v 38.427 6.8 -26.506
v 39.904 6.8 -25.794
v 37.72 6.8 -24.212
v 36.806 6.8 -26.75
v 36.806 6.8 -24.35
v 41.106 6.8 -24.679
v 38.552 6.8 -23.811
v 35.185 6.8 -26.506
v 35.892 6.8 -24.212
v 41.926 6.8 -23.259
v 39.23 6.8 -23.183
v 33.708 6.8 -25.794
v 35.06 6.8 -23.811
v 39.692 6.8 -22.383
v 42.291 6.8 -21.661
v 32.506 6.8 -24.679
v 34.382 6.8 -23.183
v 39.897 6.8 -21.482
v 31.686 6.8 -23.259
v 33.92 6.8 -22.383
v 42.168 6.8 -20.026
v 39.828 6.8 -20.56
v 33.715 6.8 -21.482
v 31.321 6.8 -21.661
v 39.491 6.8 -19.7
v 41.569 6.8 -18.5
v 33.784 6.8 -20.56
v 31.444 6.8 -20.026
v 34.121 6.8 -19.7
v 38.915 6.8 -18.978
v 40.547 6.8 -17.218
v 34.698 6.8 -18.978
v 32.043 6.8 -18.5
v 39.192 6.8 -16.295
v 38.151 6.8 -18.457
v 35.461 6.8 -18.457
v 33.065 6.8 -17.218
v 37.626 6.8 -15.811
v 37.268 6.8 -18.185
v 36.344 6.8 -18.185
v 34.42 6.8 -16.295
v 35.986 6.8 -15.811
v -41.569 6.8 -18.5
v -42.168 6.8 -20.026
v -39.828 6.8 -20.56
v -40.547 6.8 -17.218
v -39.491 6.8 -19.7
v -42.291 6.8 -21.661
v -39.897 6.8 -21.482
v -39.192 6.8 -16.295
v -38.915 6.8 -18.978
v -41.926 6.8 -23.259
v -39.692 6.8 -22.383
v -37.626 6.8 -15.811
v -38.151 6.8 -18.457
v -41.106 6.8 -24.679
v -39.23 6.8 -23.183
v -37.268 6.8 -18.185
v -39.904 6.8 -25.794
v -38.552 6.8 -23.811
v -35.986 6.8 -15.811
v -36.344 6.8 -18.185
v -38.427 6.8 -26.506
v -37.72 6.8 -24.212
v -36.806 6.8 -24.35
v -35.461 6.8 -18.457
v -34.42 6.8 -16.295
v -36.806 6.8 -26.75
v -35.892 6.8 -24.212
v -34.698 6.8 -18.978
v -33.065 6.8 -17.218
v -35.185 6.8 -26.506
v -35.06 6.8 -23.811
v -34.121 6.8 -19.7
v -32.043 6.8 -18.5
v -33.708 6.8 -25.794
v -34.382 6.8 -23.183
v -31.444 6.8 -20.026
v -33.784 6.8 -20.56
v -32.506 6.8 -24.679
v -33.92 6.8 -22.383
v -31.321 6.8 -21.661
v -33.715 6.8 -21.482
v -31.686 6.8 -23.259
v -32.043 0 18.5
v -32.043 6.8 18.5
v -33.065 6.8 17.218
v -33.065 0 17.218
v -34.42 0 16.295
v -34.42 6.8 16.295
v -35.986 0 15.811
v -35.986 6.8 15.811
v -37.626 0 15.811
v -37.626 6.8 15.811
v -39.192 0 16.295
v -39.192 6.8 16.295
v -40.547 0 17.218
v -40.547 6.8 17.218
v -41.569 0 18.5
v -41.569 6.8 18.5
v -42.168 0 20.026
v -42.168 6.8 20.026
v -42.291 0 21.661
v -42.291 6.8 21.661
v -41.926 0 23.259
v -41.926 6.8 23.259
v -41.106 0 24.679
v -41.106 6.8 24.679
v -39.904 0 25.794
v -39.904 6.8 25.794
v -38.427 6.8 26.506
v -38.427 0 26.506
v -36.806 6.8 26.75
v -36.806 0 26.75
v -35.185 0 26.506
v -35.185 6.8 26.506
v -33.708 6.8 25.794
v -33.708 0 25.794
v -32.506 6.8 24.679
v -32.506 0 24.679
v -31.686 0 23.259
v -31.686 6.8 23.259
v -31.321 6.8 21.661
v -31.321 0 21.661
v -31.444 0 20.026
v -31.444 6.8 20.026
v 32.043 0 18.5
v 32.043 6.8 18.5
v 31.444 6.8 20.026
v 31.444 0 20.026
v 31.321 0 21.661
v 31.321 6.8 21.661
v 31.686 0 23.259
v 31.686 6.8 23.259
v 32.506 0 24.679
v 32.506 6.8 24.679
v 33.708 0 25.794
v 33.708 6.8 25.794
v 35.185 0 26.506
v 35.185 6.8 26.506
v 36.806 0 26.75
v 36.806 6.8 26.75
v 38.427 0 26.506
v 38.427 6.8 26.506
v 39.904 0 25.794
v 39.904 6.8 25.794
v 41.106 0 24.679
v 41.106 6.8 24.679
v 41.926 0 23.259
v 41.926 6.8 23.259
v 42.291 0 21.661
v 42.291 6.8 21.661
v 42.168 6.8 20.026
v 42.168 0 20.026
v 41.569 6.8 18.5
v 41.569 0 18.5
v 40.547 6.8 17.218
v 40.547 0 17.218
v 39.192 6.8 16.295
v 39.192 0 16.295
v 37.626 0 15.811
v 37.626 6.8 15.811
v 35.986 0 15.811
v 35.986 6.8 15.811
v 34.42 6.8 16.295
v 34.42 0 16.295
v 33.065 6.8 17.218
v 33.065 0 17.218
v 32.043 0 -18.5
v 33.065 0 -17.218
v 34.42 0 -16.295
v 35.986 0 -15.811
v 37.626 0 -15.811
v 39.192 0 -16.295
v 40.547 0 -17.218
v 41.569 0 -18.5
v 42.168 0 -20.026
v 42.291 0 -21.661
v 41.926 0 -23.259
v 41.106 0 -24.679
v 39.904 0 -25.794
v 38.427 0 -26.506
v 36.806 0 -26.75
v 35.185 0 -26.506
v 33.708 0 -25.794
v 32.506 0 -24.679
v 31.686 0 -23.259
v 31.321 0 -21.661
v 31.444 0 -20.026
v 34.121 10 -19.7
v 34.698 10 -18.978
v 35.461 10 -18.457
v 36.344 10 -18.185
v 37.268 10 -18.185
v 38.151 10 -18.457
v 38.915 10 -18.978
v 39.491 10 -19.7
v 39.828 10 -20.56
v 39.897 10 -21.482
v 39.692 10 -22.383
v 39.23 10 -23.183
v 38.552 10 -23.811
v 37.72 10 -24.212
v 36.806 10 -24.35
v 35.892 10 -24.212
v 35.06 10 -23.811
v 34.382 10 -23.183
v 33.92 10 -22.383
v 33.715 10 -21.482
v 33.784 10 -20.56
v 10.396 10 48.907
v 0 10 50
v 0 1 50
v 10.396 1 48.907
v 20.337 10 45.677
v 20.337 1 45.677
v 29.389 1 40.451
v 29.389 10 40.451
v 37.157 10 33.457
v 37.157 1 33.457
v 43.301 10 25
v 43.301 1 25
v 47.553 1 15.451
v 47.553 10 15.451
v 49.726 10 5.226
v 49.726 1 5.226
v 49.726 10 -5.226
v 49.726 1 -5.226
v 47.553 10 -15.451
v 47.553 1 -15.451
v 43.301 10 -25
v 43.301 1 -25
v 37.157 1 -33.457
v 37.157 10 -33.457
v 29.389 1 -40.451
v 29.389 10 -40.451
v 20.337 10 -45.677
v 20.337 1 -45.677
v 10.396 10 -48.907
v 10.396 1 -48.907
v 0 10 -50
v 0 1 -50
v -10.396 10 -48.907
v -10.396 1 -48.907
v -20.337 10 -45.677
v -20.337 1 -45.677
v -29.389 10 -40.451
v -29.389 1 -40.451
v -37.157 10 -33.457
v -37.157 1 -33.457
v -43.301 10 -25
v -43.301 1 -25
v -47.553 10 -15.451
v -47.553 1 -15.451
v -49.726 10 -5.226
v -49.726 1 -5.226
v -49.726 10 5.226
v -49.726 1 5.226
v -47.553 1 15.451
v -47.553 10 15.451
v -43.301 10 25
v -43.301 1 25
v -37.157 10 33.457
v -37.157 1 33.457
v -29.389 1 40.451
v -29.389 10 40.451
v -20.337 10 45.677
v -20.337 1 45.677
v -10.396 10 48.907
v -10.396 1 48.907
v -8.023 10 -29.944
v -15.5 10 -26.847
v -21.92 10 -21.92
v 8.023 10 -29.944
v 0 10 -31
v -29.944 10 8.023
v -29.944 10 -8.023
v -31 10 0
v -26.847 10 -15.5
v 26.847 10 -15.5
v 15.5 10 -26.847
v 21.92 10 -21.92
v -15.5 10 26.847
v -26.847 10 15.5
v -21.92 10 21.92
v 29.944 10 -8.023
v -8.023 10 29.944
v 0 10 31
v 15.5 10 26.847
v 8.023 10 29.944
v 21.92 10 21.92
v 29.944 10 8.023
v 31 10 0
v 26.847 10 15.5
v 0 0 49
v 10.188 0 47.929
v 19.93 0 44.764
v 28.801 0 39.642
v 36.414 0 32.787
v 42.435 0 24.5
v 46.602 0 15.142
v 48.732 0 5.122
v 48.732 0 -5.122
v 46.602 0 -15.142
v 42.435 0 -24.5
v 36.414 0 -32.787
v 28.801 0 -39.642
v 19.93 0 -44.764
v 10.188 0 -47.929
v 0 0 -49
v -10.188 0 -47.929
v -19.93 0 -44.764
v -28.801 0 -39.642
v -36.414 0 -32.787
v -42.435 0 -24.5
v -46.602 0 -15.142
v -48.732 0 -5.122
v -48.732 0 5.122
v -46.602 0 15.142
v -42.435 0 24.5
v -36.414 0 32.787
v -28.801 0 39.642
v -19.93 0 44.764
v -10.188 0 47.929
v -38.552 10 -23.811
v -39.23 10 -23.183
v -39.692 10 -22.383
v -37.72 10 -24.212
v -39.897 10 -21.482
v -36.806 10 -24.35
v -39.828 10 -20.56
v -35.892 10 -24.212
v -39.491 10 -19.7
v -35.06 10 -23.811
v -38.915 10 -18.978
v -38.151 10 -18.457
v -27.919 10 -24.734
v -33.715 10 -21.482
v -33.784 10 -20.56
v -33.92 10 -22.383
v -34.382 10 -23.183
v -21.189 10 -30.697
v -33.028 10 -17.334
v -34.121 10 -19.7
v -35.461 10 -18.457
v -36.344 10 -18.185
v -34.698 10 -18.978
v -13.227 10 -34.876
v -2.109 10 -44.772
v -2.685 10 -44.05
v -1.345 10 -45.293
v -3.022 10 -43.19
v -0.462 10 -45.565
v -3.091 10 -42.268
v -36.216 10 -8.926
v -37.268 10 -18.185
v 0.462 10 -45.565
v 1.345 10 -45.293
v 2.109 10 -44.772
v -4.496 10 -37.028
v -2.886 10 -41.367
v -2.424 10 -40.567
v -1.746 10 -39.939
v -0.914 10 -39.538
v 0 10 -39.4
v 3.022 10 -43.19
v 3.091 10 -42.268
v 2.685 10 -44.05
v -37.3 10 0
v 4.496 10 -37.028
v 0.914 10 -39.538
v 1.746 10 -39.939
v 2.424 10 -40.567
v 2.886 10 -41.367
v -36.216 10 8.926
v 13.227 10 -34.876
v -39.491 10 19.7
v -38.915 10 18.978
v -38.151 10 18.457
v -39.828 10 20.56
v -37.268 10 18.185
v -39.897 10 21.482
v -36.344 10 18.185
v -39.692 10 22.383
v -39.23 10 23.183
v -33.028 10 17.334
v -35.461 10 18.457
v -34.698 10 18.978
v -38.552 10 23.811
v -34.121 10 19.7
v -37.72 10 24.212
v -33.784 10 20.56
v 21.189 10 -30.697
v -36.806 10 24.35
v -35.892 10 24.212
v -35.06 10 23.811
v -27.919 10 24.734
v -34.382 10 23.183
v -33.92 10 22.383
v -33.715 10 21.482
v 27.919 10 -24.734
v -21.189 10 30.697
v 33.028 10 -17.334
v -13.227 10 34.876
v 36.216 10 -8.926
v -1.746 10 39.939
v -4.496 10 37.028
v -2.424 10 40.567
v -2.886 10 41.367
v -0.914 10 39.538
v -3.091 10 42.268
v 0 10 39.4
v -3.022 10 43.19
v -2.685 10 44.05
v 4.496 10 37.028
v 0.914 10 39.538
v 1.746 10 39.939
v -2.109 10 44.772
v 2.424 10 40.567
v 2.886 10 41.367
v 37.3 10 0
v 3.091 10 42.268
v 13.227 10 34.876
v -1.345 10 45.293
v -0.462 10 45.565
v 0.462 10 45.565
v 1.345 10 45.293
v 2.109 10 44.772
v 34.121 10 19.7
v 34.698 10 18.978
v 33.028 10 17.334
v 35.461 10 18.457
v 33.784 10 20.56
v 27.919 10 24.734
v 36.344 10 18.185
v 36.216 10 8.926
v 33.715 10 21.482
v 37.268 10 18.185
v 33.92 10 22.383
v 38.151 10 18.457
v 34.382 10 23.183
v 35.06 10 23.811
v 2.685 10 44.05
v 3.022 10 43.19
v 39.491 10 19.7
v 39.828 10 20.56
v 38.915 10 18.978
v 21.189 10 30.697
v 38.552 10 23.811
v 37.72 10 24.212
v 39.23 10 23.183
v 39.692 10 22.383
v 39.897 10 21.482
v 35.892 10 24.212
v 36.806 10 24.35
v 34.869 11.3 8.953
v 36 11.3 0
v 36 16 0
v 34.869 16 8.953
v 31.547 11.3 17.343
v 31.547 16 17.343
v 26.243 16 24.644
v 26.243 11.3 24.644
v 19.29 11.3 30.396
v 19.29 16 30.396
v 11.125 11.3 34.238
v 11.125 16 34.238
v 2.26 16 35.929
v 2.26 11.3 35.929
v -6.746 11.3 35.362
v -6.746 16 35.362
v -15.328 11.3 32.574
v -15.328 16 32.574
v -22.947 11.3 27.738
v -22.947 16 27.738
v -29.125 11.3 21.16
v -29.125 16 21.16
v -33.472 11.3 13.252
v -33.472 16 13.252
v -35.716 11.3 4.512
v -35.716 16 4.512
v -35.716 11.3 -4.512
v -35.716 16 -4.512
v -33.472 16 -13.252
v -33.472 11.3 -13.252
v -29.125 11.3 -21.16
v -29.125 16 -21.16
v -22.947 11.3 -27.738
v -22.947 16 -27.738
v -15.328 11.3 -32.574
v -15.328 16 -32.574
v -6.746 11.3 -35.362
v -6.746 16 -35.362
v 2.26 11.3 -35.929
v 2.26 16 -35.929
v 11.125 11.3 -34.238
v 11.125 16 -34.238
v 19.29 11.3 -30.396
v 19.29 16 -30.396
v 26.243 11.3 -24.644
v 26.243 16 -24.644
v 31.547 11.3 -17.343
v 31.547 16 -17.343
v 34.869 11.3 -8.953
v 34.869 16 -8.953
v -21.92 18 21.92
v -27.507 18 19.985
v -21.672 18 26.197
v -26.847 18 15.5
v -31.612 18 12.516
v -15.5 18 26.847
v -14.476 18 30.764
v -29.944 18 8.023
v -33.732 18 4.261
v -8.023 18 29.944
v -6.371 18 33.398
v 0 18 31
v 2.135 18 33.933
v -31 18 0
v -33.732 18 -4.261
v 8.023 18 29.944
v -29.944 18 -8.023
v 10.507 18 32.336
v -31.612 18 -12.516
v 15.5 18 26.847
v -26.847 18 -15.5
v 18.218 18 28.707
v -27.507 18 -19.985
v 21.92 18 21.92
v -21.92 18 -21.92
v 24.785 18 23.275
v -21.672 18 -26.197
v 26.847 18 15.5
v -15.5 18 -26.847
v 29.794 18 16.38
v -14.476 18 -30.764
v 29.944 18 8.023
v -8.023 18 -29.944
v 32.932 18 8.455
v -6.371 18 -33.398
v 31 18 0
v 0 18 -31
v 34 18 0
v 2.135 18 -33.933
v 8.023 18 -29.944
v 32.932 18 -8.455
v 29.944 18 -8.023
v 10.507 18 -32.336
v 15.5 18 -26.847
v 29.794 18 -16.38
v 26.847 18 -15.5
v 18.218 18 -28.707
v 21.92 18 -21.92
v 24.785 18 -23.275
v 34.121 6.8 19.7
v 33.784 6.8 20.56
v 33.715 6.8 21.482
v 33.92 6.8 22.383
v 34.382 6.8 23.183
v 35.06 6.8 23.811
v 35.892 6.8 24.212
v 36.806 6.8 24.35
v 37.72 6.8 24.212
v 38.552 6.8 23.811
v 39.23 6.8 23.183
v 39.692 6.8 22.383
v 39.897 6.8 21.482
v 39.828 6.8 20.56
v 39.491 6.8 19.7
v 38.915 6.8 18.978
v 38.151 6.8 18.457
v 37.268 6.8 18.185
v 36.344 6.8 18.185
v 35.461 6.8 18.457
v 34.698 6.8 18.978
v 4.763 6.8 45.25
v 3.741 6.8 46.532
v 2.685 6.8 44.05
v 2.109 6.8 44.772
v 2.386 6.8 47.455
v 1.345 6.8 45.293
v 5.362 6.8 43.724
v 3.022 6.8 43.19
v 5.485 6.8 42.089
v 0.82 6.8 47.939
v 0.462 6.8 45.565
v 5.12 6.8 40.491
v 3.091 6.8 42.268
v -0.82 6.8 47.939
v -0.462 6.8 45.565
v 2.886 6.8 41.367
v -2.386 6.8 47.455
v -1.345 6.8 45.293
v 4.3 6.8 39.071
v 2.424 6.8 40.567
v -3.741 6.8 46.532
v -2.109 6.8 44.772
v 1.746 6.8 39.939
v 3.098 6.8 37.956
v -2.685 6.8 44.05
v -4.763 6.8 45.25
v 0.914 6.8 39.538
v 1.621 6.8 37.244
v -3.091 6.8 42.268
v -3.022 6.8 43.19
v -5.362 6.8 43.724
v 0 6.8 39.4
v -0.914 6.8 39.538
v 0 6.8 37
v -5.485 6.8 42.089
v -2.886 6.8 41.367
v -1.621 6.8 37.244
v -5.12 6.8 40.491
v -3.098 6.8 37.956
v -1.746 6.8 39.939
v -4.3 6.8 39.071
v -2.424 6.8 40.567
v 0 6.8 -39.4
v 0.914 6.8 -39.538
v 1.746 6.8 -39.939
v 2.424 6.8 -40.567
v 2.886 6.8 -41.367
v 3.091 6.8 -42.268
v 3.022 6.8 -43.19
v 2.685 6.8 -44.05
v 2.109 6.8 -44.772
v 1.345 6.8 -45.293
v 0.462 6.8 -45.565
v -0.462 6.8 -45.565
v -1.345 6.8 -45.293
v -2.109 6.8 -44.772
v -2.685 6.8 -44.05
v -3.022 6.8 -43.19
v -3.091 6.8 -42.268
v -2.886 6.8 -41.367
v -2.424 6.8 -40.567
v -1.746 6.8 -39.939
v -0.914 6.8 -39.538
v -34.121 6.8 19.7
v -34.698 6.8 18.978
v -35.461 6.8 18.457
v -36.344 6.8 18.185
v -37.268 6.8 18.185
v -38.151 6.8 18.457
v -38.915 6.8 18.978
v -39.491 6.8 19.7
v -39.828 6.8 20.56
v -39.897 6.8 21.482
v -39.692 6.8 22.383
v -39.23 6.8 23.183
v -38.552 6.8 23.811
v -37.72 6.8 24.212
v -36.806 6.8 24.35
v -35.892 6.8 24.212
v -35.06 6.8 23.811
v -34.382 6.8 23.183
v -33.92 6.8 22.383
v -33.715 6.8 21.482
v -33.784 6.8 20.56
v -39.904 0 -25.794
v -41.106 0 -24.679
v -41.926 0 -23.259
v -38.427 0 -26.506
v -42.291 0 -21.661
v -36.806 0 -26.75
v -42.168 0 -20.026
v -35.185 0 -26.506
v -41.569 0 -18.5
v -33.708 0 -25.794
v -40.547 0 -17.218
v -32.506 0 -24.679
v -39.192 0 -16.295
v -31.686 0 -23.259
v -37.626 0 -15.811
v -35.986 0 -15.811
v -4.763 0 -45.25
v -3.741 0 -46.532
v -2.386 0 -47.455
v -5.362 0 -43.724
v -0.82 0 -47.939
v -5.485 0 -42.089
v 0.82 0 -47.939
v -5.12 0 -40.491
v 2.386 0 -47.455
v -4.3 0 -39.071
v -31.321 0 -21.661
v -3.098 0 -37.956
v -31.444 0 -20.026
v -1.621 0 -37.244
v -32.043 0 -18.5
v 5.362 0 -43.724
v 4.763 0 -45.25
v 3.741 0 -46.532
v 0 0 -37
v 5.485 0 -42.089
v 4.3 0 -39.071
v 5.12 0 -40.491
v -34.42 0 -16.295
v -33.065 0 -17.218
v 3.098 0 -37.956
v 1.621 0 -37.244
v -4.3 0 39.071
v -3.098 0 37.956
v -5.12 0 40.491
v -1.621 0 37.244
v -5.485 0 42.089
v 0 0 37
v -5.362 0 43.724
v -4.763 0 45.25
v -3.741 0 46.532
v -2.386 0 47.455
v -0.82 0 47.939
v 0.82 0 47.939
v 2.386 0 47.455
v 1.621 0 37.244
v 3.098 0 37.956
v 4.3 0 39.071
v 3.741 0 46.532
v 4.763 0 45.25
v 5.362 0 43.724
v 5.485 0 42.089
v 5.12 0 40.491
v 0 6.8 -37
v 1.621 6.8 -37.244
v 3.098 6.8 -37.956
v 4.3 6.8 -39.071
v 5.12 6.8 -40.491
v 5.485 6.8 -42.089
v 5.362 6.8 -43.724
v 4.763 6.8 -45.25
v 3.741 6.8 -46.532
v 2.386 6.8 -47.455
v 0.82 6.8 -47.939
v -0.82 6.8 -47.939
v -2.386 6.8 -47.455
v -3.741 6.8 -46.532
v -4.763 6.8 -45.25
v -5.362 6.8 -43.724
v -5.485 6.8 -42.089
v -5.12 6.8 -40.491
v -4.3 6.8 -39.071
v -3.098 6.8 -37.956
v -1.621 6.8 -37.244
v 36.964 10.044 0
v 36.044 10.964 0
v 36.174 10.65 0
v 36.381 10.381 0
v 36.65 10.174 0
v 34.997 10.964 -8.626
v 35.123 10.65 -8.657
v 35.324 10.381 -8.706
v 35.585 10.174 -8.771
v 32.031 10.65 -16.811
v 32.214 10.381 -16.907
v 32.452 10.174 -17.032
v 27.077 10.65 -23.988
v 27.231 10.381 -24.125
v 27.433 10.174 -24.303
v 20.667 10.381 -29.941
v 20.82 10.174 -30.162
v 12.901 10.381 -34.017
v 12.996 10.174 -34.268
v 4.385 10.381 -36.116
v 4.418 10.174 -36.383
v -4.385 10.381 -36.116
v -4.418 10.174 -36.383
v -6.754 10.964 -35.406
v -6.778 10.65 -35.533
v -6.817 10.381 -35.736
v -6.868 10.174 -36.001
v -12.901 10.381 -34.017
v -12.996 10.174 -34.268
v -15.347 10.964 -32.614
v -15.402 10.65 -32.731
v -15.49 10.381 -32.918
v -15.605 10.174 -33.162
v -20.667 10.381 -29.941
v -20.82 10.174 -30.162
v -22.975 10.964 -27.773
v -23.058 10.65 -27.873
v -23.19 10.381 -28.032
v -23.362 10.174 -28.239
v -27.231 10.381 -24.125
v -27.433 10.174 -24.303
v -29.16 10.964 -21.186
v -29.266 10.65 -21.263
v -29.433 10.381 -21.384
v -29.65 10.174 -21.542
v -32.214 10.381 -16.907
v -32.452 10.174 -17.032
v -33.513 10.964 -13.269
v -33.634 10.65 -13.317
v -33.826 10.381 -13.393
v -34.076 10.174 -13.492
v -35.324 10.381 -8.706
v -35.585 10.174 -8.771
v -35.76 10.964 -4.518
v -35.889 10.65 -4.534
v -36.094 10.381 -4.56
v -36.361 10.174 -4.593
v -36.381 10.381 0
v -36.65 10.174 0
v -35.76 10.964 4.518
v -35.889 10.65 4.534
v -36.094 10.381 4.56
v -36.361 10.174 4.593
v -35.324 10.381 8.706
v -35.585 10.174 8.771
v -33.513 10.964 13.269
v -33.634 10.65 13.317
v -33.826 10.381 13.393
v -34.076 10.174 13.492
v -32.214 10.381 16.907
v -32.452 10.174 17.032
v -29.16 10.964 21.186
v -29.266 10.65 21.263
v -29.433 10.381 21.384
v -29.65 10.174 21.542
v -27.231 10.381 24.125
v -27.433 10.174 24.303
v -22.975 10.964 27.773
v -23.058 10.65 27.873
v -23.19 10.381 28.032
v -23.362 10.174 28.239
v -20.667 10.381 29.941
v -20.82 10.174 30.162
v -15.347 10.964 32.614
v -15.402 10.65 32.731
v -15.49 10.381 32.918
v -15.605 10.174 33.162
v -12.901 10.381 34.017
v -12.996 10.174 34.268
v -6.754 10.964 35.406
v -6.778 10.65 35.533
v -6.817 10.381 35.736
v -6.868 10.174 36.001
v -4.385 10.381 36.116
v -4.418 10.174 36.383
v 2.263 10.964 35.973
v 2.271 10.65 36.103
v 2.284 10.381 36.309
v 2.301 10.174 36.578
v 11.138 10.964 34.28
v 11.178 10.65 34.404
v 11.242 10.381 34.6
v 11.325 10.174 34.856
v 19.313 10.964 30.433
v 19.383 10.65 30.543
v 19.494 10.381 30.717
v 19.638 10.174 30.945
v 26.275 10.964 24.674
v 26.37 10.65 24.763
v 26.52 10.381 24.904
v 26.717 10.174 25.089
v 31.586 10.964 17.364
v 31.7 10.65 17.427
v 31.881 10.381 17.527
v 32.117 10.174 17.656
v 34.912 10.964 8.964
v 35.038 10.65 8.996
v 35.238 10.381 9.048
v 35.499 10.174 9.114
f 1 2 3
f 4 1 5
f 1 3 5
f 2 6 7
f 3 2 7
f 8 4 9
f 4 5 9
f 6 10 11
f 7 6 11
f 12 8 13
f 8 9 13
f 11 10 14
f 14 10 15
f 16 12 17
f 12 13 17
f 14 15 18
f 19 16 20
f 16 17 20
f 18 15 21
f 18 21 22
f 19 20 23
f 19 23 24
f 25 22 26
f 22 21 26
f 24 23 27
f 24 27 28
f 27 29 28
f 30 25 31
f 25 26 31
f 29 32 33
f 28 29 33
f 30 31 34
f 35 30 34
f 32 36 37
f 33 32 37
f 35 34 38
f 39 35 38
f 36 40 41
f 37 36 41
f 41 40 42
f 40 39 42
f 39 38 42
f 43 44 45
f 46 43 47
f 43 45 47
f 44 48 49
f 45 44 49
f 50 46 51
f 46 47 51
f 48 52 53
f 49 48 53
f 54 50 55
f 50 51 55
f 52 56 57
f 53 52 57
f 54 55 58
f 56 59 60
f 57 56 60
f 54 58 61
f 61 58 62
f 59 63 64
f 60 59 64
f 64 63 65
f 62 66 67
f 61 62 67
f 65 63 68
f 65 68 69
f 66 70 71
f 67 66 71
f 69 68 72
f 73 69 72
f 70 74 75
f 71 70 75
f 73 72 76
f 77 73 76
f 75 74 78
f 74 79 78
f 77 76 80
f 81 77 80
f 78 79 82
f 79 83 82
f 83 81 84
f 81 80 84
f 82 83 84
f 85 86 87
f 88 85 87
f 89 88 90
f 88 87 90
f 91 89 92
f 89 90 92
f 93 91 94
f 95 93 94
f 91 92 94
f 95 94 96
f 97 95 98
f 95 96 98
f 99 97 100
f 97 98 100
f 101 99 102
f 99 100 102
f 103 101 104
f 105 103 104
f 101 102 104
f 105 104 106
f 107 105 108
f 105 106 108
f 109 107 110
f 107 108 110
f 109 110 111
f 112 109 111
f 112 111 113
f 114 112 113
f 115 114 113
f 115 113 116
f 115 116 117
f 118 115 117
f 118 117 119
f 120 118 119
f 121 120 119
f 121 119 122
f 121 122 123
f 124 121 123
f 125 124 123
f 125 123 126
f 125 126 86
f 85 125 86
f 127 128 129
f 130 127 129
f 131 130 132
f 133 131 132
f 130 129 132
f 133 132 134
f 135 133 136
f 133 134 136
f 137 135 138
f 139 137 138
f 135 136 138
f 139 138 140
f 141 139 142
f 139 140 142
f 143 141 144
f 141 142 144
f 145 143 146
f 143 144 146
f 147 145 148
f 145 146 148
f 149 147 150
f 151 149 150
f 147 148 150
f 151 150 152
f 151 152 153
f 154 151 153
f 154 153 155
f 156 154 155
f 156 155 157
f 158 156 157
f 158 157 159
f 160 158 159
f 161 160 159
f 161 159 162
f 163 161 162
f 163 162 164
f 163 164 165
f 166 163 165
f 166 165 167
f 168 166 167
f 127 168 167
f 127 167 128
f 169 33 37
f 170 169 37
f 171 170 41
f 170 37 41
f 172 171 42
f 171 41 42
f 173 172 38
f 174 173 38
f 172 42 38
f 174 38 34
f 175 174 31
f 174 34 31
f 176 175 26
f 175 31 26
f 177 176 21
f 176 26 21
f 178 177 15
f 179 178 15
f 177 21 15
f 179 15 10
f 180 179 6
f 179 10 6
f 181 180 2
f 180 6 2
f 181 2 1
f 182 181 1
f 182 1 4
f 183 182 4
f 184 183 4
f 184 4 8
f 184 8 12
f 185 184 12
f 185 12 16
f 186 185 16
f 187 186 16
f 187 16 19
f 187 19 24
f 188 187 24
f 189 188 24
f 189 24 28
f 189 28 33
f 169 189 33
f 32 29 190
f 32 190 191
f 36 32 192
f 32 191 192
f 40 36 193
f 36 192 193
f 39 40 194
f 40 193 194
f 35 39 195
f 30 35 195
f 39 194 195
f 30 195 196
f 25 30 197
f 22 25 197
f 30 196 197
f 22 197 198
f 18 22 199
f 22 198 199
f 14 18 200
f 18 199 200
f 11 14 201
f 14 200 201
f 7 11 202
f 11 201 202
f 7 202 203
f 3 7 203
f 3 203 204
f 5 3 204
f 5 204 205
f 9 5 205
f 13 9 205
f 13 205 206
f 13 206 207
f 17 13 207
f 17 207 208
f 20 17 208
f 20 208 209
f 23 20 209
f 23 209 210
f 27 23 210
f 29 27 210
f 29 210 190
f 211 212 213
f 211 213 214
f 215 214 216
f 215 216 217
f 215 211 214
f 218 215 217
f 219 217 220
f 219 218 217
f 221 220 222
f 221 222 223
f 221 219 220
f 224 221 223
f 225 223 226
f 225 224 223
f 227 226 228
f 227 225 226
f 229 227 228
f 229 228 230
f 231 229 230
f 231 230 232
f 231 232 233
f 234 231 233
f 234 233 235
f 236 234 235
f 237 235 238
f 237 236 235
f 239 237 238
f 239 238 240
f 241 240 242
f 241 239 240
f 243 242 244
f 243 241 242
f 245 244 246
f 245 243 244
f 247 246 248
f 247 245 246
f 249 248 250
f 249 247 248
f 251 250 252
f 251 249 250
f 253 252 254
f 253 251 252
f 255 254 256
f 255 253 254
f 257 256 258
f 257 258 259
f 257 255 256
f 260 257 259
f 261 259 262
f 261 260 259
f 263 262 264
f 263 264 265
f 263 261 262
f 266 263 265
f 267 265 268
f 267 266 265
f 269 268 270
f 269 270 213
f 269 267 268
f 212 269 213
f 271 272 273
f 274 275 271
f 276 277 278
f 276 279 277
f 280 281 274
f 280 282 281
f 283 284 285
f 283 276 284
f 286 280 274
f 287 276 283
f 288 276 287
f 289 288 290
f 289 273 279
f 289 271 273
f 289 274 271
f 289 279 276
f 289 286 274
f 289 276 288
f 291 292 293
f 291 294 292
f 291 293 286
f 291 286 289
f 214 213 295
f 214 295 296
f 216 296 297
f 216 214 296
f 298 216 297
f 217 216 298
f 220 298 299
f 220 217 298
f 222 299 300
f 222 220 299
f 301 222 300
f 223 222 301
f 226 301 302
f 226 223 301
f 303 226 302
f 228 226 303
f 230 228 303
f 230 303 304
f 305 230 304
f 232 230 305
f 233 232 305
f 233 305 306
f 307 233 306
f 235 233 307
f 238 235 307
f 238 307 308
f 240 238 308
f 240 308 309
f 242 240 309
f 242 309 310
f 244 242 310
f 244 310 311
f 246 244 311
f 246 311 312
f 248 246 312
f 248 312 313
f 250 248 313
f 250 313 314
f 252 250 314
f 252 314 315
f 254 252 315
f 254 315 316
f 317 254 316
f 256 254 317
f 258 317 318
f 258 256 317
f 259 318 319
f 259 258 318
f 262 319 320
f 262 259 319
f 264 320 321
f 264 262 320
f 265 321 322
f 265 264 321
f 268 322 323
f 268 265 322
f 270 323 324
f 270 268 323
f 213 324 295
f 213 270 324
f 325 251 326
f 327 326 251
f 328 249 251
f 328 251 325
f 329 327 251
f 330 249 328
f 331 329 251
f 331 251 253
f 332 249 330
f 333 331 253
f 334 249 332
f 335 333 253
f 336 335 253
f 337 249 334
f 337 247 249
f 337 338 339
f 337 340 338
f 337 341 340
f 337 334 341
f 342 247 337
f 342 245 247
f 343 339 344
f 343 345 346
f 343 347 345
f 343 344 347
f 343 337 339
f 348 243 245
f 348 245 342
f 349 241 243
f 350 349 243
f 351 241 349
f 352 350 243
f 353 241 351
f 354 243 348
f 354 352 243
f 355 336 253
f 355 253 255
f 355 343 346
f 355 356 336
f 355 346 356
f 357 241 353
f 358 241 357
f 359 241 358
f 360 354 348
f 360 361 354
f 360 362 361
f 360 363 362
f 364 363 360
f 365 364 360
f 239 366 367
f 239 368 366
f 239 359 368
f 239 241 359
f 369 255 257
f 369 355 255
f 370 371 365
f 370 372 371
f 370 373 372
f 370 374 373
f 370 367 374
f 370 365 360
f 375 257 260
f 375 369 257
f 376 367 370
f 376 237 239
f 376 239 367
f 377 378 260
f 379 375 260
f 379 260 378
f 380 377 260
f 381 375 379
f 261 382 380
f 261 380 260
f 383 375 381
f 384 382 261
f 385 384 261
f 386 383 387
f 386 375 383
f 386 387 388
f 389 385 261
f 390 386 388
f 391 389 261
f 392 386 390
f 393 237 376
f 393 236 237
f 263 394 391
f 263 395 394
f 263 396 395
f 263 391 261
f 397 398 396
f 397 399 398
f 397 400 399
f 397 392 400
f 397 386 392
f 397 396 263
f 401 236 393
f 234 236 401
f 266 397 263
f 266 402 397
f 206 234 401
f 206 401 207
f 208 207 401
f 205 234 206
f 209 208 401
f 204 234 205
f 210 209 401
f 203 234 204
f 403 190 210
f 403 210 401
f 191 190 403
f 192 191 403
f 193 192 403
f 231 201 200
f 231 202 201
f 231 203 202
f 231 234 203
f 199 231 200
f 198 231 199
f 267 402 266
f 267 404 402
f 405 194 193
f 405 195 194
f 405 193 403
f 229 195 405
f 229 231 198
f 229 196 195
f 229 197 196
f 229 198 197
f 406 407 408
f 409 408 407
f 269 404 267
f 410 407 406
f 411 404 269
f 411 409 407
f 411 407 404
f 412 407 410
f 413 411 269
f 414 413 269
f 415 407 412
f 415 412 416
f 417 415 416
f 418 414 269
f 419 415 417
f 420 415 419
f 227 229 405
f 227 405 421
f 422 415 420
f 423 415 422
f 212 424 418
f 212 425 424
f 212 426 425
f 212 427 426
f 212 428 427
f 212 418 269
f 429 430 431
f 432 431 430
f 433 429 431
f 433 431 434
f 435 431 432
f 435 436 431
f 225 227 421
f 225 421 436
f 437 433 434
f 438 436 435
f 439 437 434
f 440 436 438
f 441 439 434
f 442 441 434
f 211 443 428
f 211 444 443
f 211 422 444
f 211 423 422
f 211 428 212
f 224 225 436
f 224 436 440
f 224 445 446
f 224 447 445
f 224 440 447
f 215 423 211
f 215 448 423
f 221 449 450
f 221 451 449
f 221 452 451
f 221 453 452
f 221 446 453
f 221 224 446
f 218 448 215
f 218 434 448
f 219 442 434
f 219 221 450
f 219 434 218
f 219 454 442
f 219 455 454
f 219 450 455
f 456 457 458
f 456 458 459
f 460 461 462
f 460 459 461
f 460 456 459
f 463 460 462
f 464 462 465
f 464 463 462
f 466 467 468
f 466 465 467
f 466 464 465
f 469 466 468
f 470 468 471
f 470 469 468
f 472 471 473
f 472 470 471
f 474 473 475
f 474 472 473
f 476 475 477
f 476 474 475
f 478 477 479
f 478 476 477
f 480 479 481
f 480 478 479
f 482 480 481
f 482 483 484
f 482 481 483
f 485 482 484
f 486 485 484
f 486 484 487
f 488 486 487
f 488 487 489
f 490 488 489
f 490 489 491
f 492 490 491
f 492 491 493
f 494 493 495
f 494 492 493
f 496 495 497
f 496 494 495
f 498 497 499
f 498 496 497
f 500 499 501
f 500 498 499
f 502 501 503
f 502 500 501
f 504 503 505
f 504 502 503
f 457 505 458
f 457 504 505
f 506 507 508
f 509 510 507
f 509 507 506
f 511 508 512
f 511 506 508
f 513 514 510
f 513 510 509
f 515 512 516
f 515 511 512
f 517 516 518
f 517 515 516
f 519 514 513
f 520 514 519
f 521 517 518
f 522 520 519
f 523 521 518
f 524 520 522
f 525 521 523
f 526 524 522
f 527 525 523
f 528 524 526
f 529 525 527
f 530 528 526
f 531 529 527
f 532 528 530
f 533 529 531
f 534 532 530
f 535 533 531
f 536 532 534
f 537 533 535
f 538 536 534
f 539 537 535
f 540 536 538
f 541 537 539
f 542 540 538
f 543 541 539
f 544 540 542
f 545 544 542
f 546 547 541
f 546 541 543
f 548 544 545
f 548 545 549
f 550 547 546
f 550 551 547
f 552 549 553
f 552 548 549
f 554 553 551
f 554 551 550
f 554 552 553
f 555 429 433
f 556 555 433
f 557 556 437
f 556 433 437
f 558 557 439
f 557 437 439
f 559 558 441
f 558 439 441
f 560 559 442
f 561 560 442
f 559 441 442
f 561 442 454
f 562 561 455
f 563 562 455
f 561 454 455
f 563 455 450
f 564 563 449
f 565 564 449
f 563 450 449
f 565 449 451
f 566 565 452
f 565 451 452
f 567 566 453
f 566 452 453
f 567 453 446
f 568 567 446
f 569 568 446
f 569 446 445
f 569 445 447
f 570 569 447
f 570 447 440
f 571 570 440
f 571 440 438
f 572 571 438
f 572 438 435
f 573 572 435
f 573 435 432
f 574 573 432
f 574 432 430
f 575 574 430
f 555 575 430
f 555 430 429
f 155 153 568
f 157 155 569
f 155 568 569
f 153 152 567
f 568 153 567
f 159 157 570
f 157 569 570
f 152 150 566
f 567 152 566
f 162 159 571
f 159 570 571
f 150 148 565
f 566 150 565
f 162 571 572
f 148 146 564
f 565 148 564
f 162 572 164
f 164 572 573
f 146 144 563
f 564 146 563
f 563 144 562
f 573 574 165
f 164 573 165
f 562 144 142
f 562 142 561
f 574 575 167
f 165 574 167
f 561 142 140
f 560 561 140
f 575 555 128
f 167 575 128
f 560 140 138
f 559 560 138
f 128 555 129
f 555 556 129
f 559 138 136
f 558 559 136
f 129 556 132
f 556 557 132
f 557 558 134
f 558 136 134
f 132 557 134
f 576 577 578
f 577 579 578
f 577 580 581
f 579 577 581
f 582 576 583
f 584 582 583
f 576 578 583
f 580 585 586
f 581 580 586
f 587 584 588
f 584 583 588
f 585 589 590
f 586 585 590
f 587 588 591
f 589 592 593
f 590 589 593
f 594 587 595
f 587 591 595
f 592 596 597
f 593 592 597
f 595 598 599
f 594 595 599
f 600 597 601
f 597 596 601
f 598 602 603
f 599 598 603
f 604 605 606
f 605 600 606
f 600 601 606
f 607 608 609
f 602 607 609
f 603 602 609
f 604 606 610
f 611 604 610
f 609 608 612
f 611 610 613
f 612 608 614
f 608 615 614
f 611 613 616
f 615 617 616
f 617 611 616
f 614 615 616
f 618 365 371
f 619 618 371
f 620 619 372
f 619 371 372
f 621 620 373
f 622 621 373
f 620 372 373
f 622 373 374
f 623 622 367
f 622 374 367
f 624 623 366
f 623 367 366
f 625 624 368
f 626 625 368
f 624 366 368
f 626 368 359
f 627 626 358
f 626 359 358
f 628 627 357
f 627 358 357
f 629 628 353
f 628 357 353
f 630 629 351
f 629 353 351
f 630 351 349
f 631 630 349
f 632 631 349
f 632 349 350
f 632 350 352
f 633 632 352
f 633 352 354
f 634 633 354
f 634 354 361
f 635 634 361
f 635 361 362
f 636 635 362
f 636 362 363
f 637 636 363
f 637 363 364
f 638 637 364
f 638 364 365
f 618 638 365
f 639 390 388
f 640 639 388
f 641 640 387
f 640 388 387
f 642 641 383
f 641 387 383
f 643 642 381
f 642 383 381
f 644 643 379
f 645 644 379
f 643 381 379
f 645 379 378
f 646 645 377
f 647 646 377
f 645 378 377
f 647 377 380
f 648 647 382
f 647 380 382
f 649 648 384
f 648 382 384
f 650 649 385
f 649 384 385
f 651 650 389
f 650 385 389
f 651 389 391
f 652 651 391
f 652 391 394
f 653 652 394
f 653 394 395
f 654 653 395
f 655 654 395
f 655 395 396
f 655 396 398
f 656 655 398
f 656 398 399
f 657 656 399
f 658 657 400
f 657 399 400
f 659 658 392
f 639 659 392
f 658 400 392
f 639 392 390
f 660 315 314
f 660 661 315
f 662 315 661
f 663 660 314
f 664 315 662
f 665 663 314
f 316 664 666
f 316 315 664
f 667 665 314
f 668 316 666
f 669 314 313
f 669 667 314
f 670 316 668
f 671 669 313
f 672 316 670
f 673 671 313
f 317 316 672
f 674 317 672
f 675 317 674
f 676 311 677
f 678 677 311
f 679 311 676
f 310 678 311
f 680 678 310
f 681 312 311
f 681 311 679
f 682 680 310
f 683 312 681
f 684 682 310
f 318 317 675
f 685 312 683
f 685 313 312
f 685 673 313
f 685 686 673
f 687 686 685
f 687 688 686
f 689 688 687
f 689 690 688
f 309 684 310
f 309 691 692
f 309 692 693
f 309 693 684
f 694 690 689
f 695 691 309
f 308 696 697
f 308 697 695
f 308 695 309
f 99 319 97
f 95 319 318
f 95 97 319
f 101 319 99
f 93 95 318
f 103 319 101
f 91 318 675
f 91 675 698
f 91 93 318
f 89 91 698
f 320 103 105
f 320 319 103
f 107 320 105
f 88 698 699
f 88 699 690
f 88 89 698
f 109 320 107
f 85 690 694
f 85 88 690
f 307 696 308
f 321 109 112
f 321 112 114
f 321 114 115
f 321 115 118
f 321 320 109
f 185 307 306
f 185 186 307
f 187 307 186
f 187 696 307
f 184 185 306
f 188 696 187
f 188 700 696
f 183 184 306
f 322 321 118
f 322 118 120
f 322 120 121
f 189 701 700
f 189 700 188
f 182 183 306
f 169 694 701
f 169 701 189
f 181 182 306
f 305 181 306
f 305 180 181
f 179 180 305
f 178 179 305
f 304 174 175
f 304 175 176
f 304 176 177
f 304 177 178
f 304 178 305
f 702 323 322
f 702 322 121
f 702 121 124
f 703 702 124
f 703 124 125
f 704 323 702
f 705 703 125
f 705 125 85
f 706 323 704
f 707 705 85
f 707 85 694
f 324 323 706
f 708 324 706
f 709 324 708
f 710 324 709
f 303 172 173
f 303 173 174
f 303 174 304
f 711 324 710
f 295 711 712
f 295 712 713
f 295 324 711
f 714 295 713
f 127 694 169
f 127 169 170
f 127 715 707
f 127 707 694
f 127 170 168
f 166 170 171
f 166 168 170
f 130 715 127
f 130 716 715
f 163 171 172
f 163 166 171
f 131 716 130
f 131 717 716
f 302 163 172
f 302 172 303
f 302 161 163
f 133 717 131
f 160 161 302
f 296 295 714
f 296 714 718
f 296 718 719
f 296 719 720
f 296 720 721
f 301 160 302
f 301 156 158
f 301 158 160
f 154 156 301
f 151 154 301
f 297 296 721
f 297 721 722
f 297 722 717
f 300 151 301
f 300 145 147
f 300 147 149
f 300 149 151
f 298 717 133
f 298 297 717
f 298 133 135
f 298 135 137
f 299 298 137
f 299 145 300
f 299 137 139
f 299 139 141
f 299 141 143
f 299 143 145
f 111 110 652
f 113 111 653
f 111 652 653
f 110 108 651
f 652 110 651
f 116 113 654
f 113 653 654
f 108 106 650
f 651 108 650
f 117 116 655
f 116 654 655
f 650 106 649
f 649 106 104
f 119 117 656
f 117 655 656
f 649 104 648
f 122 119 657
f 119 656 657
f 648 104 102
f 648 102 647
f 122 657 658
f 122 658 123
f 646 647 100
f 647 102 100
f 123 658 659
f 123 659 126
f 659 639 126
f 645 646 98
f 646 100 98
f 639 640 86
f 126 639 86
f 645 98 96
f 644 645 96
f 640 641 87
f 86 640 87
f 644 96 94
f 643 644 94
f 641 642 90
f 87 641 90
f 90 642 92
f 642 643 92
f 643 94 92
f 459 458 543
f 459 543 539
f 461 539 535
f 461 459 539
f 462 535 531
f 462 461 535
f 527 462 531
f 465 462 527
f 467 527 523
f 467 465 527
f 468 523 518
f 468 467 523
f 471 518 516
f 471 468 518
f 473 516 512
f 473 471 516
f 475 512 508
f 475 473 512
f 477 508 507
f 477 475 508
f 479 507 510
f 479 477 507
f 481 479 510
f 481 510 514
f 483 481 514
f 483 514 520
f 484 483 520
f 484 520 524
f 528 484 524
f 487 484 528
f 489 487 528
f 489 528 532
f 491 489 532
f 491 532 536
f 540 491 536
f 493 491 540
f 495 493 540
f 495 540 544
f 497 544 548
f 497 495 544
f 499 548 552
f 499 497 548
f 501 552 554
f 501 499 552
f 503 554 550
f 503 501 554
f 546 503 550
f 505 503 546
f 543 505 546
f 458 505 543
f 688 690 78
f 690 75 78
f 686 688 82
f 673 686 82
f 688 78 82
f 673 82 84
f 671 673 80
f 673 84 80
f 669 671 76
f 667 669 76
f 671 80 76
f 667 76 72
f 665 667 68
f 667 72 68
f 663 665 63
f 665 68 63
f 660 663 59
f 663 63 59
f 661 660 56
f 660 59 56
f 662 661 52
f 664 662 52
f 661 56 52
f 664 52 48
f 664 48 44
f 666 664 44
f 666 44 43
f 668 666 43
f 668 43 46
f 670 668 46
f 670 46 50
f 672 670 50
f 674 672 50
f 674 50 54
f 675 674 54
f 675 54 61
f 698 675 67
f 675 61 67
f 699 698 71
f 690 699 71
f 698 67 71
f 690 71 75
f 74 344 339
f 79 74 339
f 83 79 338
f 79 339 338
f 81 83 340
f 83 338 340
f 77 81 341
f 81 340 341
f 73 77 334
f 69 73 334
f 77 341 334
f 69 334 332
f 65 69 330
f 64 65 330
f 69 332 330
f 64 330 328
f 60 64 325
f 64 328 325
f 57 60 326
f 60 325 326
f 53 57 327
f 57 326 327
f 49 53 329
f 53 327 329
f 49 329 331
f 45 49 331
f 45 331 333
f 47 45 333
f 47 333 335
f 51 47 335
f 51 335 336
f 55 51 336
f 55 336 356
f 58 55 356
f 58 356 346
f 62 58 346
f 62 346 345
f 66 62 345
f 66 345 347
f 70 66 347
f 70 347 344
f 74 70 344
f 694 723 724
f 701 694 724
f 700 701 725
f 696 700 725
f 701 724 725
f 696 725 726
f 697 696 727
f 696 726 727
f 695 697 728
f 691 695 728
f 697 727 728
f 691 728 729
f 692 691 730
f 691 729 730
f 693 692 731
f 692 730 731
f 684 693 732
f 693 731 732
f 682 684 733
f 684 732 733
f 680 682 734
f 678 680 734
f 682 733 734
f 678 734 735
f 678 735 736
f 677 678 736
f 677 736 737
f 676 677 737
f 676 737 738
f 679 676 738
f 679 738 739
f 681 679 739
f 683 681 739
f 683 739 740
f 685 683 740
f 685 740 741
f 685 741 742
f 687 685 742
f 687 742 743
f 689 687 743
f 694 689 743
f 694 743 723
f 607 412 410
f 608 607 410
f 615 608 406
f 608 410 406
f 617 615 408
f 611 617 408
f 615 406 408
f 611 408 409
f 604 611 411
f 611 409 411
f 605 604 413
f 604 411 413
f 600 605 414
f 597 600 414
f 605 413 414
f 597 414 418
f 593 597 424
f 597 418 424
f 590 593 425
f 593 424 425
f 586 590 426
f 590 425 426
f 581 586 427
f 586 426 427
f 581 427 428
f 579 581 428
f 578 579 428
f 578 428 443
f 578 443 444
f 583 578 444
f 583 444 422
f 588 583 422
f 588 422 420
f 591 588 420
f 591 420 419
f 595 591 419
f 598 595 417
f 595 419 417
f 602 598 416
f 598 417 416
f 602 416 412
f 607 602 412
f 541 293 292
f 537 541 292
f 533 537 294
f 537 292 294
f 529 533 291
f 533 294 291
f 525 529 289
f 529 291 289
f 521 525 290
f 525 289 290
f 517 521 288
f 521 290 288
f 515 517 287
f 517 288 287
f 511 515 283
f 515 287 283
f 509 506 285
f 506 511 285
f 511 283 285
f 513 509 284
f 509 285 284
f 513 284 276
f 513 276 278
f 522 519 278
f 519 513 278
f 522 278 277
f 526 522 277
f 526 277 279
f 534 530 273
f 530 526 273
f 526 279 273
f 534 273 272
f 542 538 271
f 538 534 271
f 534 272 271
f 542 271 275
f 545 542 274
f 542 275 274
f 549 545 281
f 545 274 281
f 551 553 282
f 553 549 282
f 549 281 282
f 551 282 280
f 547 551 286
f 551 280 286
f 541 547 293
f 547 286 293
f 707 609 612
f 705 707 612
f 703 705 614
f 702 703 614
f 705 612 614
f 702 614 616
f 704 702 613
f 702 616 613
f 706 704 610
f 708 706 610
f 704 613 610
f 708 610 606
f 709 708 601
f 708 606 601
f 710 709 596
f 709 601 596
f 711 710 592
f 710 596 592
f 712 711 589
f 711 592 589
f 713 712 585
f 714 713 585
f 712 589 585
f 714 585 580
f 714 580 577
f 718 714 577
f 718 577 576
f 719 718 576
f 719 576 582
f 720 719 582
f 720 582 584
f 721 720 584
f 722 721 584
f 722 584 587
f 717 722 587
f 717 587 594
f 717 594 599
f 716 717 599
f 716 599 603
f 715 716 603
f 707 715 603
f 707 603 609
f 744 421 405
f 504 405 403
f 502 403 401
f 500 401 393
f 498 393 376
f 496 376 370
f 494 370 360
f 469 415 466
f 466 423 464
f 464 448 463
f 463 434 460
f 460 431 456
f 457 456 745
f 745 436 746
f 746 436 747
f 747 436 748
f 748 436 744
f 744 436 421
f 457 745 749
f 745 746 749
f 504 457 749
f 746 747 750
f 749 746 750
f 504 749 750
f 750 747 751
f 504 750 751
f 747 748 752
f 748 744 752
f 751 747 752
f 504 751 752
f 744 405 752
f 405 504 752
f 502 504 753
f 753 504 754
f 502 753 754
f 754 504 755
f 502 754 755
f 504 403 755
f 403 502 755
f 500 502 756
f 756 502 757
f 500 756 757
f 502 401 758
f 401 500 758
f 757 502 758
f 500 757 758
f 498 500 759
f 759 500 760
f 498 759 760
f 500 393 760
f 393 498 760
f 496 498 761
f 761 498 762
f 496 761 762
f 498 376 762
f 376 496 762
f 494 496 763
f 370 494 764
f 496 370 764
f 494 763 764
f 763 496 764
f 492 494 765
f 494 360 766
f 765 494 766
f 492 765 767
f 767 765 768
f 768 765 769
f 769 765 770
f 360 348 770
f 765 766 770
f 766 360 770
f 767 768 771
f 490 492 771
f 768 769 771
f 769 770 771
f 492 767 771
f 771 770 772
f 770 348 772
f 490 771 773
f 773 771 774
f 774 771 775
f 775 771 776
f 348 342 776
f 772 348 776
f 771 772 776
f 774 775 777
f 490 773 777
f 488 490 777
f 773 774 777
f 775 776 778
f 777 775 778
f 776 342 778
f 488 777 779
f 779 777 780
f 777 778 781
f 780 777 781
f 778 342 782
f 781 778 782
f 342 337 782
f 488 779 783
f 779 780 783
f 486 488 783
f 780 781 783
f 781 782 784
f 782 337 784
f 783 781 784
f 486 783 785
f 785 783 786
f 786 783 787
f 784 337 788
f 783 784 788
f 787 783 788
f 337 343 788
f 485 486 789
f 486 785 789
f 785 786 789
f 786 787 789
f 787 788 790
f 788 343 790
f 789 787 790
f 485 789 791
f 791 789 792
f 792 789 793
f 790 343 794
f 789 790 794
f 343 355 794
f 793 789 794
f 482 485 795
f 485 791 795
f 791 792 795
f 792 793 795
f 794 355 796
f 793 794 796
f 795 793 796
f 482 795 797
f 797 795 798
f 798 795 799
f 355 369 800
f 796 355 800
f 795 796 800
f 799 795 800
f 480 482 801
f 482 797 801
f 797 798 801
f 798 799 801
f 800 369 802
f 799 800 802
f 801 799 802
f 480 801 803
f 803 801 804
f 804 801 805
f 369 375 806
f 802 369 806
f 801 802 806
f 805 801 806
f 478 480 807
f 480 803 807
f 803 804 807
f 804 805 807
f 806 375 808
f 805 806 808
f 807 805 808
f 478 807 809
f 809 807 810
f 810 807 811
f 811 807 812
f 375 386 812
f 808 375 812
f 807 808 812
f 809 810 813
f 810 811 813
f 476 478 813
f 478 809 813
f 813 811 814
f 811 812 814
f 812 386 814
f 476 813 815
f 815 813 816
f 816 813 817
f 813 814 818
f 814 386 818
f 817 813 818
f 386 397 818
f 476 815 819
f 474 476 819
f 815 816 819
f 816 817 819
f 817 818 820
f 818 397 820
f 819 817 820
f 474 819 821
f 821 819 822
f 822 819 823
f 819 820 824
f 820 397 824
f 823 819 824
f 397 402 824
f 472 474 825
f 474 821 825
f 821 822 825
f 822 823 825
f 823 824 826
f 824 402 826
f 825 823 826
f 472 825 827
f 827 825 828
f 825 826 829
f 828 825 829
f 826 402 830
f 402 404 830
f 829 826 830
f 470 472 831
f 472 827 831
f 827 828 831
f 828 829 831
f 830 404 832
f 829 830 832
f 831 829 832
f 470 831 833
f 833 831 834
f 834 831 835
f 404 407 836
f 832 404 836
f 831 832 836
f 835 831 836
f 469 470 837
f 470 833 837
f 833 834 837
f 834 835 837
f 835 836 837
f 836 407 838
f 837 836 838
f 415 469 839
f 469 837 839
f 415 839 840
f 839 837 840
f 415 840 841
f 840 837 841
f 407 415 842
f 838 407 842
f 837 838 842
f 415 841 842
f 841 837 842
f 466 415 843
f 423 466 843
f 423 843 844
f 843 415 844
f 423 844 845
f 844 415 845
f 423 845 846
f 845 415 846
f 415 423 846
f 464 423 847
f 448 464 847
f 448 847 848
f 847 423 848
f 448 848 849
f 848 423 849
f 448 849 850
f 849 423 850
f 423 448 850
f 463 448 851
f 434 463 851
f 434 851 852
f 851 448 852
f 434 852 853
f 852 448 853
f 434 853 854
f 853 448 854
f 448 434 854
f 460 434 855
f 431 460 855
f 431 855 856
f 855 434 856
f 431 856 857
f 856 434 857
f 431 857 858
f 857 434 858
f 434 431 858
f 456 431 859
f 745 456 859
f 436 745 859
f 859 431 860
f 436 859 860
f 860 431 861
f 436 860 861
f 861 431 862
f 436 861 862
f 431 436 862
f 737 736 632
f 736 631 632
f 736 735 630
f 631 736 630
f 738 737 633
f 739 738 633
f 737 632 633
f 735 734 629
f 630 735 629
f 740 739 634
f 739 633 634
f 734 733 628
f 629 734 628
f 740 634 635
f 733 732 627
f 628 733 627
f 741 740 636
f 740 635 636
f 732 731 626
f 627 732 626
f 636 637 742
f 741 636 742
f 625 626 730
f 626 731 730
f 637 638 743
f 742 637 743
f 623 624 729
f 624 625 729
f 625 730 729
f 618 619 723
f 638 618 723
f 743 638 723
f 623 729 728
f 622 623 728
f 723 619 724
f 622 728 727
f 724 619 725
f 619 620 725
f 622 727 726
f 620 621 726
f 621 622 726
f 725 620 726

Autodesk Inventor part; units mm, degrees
ref_plane "YZ Plane" through (0, 0, 0) normal (1, 0, 0) x (0, 1, 0)
ref_plane "XZ Plane" through (0, 0, 0) normal (0, 1, 0) x (-1, 0, 0)
ref_plane "XY Plane" through (0, 0, 0) normal (0, 0, 1) x (1, 0, 0)
sketch "Эскиз1" plane through (0, 0, 0) normal (0, 0, 1) x (1, 0, 0)
  line L0 (0, 5) -> (0, 0)
  line L1 (0, 0) -> (36, 0)
  line L2 (36, 0) -> (36, 20)
  line L3 (36, 20) -> (31, 20)
  line L4 (31, 20) -> (31, 5)
  line L5 (31, 5) -> (0, 5)
  dimension "d0" = 5
  dimension "d1" = 5
  dimension "d3" = 20
  dimension "d4" = 36
revolve "Вращение1" add sketch "Эскиз1" angle 360 about axis through (0, 5, 0) along (0, -1, 0)
sketch "Эскиз2" plane through (0, 0, 0) normal (1, 0, 0) x (0, 1, 0)
  line L0 (-4, 0) -> (24, 0) projected
  line L1 (0, -50.4) -> (0, 50.4) projected
  line L2 (0, 0) -> (0, 50)
  line L3 (0, 50) -> (10, 50)
  line L4 (10, 50) -> (10, 0)
  line L5 (0, 0) -> (10, 0)
  line L6 (20, 36) -> (0, 36) projected
  dimension "d6" = 10
  dimension "d7" = 50
revolve "Вращение2" add sketch "Эскиз2" angle 360 about axis through (0, -10, 0) along (0, 1, 0)
chamfer "Фаска1" distance 1 angle 45 1 edges at (0, 0, -50)
sketch "Эскиз3" plane through (0, 0, 0) normal (0, -1, 0) x (1, 0, 0)
  circle A0 centre (0, 0) radius 42.5 construction
  circle A1 centre (0, 42.5) radius 5.5
  line L0 (0, -70) -> (0, 70) projected
  line L1 (-70, 0) -> (70, 0) projected
  dimension "d10" = 85
  dimension "d9" = 11
hole "Отверстие1" at (0, 0, 42.5) direction (0, 1, 0) diameter 6.2 depth 15 tip angle 118 counterbore diameter 11 counterbore depth 6.8
pattern_circular "Круговой массив1" count 6 over 360 about axis through (0, -10, 0) along (0, 1, 0) of "Отверстие1"
sketch "Эскиз4" plane through (0, 20, 0) normal (0, 1, 0) x (1, 0, 0)
  circle A0 centre (0, 0) radius 36 projected
  circle A1 centre (0, 0) radius 31 projected
  circle A2 centre (0, 0) radius 31
  circle A3 centre (0, 0) radius 36
  dimension "d27" = 72
extrude "Выдавливание2" add sketch "Эскиз4" along normal blind 1
fillet "Сопряжение1" radius 1.3 1 edges at (-36, 10, 0)
sketch "Эскиз5" plane through (0, 21, 0) normal (0, 1, 0) x (1, 0, 0)
  circle A0 centre (0, 0) radius 31 projected
  circle A1 centre (0, 0) radius 36 projected
  point P0 (0, 0)
extrude "Выдавливание3" cut sketch "Эскиз5" against normal blind 3
chamfer "Фаска2" distance 2 angle 45 1 edges at (-36, 18, 0)
properties part number "Крышка большая_72"
